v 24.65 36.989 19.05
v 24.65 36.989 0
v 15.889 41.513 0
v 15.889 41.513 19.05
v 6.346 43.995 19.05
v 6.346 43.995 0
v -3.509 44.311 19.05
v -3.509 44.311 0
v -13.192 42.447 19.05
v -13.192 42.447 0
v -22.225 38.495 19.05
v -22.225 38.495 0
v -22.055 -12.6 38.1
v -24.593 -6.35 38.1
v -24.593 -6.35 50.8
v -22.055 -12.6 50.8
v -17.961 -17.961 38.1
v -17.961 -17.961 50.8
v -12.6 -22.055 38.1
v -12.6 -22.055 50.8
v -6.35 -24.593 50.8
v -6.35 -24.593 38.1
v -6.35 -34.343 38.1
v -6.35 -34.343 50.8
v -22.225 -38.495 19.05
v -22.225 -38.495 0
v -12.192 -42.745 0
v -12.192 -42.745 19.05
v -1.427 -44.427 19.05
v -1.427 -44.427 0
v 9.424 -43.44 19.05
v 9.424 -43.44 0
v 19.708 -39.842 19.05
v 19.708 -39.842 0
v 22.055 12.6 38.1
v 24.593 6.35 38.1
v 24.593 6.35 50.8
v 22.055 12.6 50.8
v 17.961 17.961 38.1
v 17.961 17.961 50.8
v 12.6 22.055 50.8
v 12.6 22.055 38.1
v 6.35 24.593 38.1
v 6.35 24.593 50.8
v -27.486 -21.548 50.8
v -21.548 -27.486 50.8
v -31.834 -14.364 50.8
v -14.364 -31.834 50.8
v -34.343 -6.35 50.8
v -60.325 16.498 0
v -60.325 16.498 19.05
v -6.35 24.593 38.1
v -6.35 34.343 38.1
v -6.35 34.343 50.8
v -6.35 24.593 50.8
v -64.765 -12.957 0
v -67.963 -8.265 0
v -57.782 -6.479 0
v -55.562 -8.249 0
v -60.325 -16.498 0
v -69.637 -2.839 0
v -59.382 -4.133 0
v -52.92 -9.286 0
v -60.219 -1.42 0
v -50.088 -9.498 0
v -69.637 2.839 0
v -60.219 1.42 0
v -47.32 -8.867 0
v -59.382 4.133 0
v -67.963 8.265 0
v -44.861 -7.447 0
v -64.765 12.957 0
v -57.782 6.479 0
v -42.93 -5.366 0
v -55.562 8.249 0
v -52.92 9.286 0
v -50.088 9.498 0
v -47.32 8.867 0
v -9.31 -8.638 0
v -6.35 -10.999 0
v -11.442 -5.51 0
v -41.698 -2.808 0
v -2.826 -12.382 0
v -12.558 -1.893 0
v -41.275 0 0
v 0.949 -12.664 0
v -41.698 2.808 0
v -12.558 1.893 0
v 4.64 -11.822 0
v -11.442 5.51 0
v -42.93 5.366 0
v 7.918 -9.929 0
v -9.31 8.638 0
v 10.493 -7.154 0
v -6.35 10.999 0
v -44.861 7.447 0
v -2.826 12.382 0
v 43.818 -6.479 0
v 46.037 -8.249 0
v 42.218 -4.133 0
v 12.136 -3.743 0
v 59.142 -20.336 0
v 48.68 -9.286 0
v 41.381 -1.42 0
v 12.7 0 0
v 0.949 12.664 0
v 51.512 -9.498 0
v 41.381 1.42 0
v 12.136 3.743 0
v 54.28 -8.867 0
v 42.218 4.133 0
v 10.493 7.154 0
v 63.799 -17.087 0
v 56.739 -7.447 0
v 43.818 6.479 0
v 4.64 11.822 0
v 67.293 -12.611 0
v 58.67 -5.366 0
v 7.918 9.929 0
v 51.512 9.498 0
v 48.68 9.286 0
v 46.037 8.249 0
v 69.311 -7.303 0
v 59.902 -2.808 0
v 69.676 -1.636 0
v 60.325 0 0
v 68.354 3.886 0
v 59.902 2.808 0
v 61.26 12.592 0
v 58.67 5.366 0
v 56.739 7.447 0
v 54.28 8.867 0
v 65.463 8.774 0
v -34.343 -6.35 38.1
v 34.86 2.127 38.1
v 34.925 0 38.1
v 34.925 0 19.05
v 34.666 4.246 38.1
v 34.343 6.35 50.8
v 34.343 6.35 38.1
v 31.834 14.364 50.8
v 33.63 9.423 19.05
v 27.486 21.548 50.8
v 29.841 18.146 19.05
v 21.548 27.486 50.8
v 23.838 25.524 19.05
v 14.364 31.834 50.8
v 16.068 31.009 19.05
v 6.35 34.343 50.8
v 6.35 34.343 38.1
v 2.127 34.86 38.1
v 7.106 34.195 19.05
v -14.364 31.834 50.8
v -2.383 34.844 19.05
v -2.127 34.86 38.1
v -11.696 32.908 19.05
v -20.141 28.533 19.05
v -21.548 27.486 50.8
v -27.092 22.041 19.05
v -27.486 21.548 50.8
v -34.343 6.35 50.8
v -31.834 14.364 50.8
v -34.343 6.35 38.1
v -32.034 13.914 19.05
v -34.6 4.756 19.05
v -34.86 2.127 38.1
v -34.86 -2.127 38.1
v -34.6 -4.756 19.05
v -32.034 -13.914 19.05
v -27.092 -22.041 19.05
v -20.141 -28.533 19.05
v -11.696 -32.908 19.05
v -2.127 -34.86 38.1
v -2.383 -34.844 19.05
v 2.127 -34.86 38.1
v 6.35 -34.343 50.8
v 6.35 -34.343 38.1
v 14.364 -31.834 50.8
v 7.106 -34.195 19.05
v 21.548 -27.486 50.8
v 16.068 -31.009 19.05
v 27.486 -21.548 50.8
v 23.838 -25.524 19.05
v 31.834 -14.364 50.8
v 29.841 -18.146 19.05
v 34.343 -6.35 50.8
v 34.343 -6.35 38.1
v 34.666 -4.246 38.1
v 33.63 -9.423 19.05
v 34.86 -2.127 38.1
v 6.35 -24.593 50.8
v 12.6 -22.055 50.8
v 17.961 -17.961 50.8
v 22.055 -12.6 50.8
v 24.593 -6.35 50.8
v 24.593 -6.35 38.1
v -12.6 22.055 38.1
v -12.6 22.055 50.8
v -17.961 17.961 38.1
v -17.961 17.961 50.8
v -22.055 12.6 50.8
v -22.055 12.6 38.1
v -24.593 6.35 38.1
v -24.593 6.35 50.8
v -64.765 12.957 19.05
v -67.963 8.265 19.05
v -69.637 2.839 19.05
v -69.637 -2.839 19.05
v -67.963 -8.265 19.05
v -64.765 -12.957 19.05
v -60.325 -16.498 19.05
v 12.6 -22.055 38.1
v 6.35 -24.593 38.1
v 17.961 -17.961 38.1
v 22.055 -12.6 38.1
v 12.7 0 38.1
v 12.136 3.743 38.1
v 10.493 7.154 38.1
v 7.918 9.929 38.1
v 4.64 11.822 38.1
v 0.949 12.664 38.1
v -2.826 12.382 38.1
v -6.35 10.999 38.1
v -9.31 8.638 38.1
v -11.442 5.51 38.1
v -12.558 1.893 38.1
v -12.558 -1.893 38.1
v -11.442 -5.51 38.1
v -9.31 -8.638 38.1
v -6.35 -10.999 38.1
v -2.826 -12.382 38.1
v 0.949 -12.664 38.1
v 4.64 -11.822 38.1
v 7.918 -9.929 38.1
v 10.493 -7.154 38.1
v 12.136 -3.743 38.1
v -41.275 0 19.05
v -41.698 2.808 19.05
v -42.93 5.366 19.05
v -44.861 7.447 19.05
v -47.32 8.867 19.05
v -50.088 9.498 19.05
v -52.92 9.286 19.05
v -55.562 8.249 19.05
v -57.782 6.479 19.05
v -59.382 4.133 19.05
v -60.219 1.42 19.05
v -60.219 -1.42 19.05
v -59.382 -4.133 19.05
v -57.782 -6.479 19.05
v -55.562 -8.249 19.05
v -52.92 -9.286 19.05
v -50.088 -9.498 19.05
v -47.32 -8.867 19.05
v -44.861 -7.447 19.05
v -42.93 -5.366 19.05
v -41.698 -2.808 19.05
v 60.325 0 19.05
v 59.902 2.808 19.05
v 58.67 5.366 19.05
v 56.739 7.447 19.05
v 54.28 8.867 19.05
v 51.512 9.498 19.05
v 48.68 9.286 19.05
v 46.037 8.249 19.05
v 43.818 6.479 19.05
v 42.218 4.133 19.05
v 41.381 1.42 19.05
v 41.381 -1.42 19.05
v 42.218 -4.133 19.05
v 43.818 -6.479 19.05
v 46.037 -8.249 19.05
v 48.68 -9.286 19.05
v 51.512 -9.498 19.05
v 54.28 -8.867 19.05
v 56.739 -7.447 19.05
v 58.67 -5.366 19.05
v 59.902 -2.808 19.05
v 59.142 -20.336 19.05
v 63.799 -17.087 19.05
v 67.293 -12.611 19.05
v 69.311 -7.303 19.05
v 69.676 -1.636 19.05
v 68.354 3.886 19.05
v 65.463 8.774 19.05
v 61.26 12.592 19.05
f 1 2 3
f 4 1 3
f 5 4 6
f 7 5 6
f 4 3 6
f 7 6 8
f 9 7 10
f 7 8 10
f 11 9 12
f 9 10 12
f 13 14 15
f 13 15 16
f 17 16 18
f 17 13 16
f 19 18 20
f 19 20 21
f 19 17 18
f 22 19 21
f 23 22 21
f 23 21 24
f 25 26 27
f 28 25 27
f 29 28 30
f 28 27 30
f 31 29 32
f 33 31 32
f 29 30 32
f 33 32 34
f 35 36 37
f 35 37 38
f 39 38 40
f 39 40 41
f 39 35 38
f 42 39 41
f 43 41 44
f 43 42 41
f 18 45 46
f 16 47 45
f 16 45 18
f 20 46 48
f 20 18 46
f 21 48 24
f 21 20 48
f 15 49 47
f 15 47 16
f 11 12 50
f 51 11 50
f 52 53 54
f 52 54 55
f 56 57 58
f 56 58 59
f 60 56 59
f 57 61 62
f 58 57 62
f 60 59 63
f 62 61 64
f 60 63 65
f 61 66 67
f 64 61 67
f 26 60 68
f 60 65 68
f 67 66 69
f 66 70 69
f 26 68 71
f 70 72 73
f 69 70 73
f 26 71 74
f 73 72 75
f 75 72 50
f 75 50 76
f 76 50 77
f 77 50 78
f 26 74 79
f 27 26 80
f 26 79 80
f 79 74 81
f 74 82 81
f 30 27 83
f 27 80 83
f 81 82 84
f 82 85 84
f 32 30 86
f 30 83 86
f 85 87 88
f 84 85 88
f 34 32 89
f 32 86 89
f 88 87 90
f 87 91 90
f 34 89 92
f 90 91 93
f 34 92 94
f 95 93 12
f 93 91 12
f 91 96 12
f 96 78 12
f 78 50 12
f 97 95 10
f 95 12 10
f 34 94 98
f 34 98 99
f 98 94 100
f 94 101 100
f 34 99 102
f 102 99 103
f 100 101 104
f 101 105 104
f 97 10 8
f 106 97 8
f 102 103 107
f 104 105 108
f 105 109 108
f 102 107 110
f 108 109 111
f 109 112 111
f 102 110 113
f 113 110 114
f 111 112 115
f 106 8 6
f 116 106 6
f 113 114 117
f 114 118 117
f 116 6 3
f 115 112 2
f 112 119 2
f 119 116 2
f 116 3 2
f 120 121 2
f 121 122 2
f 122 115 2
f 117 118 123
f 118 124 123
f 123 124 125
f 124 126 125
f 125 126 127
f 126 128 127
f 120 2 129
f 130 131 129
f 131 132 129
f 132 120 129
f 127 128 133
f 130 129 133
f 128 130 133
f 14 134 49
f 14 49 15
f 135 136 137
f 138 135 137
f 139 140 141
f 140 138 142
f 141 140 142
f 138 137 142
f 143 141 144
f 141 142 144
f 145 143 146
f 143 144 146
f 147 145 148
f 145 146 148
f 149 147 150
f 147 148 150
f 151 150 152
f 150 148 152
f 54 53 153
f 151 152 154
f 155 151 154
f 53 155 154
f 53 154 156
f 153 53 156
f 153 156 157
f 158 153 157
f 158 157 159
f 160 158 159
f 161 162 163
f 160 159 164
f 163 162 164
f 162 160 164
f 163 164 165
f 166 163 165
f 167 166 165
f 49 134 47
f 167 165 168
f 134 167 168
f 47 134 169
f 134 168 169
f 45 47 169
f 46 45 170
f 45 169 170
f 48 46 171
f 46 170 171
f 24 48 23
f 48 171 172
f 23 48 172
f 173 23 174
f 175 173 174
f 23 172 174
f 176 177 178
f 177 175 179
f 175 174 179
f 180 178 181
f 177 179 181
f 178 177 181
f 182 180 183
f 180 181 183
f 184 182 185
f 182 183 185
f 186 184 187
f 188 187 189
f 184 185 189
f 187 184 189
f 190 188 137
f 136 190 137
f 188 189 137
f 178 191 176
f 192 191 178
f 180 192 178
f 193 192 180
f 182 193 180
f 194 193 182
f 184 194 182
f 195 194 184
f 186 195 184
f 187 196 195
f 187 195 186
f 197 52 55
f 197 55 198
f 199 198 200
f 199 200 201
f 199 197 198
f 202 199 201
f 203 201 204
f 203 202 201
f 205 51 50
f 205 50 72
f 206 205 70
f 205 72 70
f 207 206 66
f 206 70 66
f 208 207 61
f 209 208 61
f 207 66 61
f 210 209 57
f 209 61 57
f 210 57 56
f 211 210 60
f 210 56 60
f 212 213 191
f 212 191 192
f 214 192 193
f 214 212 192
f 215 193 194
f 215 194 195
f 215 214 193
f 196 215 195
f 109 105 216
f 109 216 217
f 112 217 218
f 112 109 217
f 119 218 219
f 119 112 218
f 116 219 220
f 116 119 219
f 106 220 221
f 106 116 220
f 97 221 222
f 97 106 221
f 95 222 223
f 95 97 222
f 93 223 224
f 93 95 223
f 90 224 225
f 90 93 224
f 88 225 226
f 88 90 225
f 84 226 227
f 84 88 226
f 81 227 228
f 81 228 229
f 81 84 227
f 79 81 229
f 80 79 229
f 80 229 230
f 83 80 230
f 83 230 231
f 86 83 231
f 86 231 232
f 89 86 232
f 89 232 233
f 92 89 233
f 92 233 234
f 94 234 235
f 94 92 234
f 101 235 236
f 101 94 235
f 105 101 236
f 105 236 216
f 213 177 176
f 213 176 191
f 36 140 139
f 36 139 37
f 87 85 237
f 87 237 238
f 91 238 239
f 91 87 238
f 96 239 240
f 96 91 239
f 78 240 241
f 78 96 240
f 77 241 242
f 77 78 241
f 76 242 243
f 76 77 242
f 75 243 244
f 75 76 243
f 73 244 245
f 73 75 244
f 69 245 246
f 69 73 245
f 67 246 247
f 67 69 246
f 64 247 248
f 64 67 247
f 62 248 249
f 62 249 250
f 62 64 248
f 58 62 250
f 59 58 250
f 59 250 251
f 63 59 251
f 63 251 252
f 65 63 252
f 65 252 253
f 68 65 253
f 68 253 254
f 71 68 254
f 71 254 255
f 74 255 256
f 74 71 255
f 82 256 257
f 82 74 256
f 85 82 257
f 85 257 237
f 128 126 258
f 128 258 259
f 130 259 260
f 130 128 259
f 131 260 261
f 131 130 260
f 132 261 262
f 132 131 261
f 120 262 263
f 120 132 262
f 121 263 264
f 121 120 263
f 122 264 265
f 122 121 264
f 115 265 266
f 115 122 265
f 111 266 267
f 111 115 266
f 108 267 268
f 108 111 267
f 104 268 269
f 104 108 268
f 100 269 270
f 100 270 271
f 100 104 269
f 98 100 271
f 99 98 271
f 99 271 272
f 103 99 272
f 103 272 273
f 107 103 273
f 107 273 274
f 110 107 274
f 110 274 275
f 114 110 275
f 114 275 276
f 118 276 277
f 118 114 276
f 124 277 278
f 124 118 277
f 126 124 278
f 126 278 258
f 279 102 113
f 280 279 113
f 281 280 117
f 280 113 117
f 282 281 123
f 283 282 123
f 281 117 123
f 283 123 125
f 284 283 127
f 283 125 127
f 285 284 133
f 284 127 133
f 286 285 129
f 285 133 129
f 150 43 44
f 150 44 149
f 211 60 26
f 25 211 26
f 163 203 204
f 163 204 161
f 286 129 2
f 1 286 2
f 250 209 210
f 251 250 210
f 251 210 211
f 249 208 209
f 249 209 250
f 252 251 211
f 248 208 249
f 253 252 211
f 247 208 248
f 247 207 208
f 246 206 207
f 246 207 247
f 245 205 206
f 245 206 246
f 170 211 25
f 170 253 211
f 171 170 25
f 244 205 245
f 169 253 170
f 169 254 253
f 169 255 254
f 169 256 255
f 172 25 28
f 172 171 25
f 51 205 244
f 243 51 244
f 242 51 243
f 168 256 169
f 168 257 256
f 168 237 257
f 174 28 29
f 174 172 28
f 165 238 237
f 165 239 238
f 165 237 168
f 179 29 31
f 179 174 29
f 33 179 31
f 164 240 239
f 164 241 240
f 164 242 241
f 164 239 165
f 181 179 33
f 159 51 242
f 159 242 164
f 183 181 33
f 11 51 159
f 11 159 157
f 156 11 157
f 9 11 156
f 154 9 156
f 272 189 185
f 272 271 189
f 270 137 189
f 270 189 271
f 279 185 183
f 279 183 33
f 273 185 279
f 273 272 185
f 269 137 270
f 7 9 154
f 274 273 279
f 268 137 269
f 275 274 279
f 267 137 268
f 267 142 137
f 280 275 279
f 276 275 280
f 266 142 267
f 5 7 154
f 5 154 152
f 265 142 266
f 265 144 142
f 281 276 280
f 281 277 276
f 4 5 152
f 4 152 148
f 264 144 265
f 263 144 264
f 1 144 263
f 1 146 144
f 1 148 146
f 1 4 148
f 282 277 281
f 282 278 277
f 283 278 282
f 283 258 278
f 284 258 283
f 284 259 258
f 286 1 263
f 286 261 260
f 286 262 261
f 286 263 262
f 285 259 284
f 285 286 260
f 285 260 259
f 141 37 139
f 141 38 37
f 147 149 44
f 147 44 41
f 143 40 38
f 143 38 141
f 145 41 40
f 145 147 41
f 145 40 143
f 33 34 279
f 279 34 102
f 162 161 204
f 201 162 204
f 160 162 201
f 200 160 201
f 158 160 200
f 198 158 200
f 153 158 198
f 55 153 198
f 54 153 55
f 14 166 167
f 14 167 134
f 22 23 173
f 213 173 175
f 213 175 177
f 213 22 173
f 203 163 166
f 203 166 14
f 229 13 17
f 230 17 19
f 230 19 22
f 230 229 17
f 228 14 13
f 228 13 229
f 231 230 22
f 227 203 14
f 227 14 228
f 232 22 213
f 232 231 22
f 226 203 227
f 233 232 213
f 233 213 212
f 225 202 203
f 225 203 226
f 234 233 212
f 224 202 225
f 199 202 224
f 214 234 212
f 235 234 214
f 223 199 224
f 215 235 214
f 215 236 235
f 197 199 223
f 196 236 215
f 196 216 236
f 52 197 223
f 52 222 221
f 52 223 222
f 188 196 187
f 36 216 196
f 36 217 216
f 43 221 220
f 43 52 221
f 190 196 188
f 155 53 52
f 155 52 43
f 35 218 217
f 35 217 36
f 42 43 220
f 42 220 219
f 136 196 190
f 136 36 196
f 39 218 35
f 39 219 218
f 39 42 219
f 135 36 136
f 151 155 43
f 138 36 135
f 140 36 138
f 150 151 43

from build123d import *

# Parameters (mm, degrees)
F0_R     = 9.525
F0_R_2   = 34.925
F1_DEPTH = 19.05
F0_R_3   = 25.4
F2_DEPTH = 50.8
F0_R_4   = 12.7
F3_DEPTH = 38.1
F5_DEPTH = 12.7
F7_DEPTH = 12.7


with BuildPart() as f1:
    # F0 (on Top) → F1 (new body)
    with BuildSketch(Plane.XY):
        with BuildLine():
            Line((-60.325, -16.4977839421), (-22.225, -38.4948291982))
            ThreePointArc((-22.225, -38.4948291982), (-1.4272180614, -44.4270812524), (19.7084347148, -39.8419389725))
            Line((19.7084347148, -39.8419389725), (59.1417276134, -20.3356473933))
            ThreePointArc((59.1417276134, -20.3356473933), (69.70597644, -4.4832296998), (61.2595044194, 12.5918870027))
            Line((61.2595044194, 12.5918870027), (24.6499139288, 36.9889746181))
            ThreePointArc((24.6499139288, 36.9889746181), (1.4272180614, 44.4270812524), (-22.225, 38.4948291982))
            Line((-22.225, 38.4948291982), (-60.325, 16.4977839421))
            ThreePointArc((-60.325, 16.4977839421), (-69.85, 0), (-60.325, -16.4977839421))
        make_face()
        with Locations((-50.8, 0)):
            Circle(F0_R, mode=Mode.SUBTRACT)
        Circle(F0_R_2, mode=Mode.SUBTRACT)
        with Locations((50.8, 0)):
            Circle(F0_R, mode=Mode.SUBTRACT)
    extrude(amount=F1_DEPTH)

    # F0 (on Top) → F2 (join)
    with BuildSketch(Plane.XY):
        Circle(F0_R_2)
        Circle(F0_R_3, mode=Mode.SUBTRACT)
    extrude(amount=F2_DEPTH)

    # F0 (on Top) → F3 (join)
    with BuildSketch(Plane.XY):
        Circle(F0_R_3)
        Circle(F0_R_4, mode=Mode.SUBTRACT)
    extrude(amount=F3_DEPTH)

    # F4 (on face) → F5 (cut)
    with BuildSketch(Plane.XY.offset(50.8)):
        with BuildLine():
            ThreePointArc((6.35, 34.3428758988), (0, 34.925), (-6.35, 34.3428758988))
            Line((-6.35, 34.3428758988), (-6.35, 24.5934442484))
            ThreePointArc((-6.35, 24.5934442484), (0, 25.4), (6.35, 24.5934442484))
            Line((6.35, 24.5934442484), (6.35, 34.3428758988))
        make_face()
    extrude(amount=-F5_DEPTH, mode=Mode.SUBTRACT)

    # F6 (on face) → F7 (cut)
    with BuildSketch(Plane.XY.offset(50.8)):
        with BuildLine():
            Line((-24.5934442484, 6.35), (-34.3428758988, 6.35))
            ThreePointArc((-34.3428758988, 6.35), (-34.925, 0), (-34.3428758988, -6.35))
            Line((-34.3428758988, -6.35), (-24.5934442484, -6.35))
            ThreePointArc((-24.5934442484, -6.35), (-25.4, 0), (-24.5934442484, 6.35))
        make_face()
        with BuildLine():
            Line((-6.35, -24.5934442484), (-6.35, -34.3428758988))
            ThreePointArc((-6.35, -34.3428758988), (0, -34.925), (6.35, -34.3428758988))
            Line((6.35, -34.3428758988), (6.35, -24.5934442484))
            ThreePointArc((6.35, -24.5934442484), (0, -25.4), (-6.35, -24.5934442484))
        make_face()
        with BuildLine():
            Line((24.5934442484, -6.35), (34.3428758988, -6.35))
            ThreePointArc((34.3428758988, -6.35), (34.7791644937, -3.1883133656), (34.925, 0))
            ThreePointArc((34.925, 0), (34.7791644937, 3.1883133656), (34.3428758988, 6.35))
            Line((34.3428758988, 6.35), (24.5934442484, 6.35))
            ThreePointArc((24.5934442484, 6.35), (25.4, 0), (24.5934442484, -6.35))
        make_face()
    extrude(amount=-F7_DEPTH, mode=Mode.SUBTRACT)


solid = f1.part
